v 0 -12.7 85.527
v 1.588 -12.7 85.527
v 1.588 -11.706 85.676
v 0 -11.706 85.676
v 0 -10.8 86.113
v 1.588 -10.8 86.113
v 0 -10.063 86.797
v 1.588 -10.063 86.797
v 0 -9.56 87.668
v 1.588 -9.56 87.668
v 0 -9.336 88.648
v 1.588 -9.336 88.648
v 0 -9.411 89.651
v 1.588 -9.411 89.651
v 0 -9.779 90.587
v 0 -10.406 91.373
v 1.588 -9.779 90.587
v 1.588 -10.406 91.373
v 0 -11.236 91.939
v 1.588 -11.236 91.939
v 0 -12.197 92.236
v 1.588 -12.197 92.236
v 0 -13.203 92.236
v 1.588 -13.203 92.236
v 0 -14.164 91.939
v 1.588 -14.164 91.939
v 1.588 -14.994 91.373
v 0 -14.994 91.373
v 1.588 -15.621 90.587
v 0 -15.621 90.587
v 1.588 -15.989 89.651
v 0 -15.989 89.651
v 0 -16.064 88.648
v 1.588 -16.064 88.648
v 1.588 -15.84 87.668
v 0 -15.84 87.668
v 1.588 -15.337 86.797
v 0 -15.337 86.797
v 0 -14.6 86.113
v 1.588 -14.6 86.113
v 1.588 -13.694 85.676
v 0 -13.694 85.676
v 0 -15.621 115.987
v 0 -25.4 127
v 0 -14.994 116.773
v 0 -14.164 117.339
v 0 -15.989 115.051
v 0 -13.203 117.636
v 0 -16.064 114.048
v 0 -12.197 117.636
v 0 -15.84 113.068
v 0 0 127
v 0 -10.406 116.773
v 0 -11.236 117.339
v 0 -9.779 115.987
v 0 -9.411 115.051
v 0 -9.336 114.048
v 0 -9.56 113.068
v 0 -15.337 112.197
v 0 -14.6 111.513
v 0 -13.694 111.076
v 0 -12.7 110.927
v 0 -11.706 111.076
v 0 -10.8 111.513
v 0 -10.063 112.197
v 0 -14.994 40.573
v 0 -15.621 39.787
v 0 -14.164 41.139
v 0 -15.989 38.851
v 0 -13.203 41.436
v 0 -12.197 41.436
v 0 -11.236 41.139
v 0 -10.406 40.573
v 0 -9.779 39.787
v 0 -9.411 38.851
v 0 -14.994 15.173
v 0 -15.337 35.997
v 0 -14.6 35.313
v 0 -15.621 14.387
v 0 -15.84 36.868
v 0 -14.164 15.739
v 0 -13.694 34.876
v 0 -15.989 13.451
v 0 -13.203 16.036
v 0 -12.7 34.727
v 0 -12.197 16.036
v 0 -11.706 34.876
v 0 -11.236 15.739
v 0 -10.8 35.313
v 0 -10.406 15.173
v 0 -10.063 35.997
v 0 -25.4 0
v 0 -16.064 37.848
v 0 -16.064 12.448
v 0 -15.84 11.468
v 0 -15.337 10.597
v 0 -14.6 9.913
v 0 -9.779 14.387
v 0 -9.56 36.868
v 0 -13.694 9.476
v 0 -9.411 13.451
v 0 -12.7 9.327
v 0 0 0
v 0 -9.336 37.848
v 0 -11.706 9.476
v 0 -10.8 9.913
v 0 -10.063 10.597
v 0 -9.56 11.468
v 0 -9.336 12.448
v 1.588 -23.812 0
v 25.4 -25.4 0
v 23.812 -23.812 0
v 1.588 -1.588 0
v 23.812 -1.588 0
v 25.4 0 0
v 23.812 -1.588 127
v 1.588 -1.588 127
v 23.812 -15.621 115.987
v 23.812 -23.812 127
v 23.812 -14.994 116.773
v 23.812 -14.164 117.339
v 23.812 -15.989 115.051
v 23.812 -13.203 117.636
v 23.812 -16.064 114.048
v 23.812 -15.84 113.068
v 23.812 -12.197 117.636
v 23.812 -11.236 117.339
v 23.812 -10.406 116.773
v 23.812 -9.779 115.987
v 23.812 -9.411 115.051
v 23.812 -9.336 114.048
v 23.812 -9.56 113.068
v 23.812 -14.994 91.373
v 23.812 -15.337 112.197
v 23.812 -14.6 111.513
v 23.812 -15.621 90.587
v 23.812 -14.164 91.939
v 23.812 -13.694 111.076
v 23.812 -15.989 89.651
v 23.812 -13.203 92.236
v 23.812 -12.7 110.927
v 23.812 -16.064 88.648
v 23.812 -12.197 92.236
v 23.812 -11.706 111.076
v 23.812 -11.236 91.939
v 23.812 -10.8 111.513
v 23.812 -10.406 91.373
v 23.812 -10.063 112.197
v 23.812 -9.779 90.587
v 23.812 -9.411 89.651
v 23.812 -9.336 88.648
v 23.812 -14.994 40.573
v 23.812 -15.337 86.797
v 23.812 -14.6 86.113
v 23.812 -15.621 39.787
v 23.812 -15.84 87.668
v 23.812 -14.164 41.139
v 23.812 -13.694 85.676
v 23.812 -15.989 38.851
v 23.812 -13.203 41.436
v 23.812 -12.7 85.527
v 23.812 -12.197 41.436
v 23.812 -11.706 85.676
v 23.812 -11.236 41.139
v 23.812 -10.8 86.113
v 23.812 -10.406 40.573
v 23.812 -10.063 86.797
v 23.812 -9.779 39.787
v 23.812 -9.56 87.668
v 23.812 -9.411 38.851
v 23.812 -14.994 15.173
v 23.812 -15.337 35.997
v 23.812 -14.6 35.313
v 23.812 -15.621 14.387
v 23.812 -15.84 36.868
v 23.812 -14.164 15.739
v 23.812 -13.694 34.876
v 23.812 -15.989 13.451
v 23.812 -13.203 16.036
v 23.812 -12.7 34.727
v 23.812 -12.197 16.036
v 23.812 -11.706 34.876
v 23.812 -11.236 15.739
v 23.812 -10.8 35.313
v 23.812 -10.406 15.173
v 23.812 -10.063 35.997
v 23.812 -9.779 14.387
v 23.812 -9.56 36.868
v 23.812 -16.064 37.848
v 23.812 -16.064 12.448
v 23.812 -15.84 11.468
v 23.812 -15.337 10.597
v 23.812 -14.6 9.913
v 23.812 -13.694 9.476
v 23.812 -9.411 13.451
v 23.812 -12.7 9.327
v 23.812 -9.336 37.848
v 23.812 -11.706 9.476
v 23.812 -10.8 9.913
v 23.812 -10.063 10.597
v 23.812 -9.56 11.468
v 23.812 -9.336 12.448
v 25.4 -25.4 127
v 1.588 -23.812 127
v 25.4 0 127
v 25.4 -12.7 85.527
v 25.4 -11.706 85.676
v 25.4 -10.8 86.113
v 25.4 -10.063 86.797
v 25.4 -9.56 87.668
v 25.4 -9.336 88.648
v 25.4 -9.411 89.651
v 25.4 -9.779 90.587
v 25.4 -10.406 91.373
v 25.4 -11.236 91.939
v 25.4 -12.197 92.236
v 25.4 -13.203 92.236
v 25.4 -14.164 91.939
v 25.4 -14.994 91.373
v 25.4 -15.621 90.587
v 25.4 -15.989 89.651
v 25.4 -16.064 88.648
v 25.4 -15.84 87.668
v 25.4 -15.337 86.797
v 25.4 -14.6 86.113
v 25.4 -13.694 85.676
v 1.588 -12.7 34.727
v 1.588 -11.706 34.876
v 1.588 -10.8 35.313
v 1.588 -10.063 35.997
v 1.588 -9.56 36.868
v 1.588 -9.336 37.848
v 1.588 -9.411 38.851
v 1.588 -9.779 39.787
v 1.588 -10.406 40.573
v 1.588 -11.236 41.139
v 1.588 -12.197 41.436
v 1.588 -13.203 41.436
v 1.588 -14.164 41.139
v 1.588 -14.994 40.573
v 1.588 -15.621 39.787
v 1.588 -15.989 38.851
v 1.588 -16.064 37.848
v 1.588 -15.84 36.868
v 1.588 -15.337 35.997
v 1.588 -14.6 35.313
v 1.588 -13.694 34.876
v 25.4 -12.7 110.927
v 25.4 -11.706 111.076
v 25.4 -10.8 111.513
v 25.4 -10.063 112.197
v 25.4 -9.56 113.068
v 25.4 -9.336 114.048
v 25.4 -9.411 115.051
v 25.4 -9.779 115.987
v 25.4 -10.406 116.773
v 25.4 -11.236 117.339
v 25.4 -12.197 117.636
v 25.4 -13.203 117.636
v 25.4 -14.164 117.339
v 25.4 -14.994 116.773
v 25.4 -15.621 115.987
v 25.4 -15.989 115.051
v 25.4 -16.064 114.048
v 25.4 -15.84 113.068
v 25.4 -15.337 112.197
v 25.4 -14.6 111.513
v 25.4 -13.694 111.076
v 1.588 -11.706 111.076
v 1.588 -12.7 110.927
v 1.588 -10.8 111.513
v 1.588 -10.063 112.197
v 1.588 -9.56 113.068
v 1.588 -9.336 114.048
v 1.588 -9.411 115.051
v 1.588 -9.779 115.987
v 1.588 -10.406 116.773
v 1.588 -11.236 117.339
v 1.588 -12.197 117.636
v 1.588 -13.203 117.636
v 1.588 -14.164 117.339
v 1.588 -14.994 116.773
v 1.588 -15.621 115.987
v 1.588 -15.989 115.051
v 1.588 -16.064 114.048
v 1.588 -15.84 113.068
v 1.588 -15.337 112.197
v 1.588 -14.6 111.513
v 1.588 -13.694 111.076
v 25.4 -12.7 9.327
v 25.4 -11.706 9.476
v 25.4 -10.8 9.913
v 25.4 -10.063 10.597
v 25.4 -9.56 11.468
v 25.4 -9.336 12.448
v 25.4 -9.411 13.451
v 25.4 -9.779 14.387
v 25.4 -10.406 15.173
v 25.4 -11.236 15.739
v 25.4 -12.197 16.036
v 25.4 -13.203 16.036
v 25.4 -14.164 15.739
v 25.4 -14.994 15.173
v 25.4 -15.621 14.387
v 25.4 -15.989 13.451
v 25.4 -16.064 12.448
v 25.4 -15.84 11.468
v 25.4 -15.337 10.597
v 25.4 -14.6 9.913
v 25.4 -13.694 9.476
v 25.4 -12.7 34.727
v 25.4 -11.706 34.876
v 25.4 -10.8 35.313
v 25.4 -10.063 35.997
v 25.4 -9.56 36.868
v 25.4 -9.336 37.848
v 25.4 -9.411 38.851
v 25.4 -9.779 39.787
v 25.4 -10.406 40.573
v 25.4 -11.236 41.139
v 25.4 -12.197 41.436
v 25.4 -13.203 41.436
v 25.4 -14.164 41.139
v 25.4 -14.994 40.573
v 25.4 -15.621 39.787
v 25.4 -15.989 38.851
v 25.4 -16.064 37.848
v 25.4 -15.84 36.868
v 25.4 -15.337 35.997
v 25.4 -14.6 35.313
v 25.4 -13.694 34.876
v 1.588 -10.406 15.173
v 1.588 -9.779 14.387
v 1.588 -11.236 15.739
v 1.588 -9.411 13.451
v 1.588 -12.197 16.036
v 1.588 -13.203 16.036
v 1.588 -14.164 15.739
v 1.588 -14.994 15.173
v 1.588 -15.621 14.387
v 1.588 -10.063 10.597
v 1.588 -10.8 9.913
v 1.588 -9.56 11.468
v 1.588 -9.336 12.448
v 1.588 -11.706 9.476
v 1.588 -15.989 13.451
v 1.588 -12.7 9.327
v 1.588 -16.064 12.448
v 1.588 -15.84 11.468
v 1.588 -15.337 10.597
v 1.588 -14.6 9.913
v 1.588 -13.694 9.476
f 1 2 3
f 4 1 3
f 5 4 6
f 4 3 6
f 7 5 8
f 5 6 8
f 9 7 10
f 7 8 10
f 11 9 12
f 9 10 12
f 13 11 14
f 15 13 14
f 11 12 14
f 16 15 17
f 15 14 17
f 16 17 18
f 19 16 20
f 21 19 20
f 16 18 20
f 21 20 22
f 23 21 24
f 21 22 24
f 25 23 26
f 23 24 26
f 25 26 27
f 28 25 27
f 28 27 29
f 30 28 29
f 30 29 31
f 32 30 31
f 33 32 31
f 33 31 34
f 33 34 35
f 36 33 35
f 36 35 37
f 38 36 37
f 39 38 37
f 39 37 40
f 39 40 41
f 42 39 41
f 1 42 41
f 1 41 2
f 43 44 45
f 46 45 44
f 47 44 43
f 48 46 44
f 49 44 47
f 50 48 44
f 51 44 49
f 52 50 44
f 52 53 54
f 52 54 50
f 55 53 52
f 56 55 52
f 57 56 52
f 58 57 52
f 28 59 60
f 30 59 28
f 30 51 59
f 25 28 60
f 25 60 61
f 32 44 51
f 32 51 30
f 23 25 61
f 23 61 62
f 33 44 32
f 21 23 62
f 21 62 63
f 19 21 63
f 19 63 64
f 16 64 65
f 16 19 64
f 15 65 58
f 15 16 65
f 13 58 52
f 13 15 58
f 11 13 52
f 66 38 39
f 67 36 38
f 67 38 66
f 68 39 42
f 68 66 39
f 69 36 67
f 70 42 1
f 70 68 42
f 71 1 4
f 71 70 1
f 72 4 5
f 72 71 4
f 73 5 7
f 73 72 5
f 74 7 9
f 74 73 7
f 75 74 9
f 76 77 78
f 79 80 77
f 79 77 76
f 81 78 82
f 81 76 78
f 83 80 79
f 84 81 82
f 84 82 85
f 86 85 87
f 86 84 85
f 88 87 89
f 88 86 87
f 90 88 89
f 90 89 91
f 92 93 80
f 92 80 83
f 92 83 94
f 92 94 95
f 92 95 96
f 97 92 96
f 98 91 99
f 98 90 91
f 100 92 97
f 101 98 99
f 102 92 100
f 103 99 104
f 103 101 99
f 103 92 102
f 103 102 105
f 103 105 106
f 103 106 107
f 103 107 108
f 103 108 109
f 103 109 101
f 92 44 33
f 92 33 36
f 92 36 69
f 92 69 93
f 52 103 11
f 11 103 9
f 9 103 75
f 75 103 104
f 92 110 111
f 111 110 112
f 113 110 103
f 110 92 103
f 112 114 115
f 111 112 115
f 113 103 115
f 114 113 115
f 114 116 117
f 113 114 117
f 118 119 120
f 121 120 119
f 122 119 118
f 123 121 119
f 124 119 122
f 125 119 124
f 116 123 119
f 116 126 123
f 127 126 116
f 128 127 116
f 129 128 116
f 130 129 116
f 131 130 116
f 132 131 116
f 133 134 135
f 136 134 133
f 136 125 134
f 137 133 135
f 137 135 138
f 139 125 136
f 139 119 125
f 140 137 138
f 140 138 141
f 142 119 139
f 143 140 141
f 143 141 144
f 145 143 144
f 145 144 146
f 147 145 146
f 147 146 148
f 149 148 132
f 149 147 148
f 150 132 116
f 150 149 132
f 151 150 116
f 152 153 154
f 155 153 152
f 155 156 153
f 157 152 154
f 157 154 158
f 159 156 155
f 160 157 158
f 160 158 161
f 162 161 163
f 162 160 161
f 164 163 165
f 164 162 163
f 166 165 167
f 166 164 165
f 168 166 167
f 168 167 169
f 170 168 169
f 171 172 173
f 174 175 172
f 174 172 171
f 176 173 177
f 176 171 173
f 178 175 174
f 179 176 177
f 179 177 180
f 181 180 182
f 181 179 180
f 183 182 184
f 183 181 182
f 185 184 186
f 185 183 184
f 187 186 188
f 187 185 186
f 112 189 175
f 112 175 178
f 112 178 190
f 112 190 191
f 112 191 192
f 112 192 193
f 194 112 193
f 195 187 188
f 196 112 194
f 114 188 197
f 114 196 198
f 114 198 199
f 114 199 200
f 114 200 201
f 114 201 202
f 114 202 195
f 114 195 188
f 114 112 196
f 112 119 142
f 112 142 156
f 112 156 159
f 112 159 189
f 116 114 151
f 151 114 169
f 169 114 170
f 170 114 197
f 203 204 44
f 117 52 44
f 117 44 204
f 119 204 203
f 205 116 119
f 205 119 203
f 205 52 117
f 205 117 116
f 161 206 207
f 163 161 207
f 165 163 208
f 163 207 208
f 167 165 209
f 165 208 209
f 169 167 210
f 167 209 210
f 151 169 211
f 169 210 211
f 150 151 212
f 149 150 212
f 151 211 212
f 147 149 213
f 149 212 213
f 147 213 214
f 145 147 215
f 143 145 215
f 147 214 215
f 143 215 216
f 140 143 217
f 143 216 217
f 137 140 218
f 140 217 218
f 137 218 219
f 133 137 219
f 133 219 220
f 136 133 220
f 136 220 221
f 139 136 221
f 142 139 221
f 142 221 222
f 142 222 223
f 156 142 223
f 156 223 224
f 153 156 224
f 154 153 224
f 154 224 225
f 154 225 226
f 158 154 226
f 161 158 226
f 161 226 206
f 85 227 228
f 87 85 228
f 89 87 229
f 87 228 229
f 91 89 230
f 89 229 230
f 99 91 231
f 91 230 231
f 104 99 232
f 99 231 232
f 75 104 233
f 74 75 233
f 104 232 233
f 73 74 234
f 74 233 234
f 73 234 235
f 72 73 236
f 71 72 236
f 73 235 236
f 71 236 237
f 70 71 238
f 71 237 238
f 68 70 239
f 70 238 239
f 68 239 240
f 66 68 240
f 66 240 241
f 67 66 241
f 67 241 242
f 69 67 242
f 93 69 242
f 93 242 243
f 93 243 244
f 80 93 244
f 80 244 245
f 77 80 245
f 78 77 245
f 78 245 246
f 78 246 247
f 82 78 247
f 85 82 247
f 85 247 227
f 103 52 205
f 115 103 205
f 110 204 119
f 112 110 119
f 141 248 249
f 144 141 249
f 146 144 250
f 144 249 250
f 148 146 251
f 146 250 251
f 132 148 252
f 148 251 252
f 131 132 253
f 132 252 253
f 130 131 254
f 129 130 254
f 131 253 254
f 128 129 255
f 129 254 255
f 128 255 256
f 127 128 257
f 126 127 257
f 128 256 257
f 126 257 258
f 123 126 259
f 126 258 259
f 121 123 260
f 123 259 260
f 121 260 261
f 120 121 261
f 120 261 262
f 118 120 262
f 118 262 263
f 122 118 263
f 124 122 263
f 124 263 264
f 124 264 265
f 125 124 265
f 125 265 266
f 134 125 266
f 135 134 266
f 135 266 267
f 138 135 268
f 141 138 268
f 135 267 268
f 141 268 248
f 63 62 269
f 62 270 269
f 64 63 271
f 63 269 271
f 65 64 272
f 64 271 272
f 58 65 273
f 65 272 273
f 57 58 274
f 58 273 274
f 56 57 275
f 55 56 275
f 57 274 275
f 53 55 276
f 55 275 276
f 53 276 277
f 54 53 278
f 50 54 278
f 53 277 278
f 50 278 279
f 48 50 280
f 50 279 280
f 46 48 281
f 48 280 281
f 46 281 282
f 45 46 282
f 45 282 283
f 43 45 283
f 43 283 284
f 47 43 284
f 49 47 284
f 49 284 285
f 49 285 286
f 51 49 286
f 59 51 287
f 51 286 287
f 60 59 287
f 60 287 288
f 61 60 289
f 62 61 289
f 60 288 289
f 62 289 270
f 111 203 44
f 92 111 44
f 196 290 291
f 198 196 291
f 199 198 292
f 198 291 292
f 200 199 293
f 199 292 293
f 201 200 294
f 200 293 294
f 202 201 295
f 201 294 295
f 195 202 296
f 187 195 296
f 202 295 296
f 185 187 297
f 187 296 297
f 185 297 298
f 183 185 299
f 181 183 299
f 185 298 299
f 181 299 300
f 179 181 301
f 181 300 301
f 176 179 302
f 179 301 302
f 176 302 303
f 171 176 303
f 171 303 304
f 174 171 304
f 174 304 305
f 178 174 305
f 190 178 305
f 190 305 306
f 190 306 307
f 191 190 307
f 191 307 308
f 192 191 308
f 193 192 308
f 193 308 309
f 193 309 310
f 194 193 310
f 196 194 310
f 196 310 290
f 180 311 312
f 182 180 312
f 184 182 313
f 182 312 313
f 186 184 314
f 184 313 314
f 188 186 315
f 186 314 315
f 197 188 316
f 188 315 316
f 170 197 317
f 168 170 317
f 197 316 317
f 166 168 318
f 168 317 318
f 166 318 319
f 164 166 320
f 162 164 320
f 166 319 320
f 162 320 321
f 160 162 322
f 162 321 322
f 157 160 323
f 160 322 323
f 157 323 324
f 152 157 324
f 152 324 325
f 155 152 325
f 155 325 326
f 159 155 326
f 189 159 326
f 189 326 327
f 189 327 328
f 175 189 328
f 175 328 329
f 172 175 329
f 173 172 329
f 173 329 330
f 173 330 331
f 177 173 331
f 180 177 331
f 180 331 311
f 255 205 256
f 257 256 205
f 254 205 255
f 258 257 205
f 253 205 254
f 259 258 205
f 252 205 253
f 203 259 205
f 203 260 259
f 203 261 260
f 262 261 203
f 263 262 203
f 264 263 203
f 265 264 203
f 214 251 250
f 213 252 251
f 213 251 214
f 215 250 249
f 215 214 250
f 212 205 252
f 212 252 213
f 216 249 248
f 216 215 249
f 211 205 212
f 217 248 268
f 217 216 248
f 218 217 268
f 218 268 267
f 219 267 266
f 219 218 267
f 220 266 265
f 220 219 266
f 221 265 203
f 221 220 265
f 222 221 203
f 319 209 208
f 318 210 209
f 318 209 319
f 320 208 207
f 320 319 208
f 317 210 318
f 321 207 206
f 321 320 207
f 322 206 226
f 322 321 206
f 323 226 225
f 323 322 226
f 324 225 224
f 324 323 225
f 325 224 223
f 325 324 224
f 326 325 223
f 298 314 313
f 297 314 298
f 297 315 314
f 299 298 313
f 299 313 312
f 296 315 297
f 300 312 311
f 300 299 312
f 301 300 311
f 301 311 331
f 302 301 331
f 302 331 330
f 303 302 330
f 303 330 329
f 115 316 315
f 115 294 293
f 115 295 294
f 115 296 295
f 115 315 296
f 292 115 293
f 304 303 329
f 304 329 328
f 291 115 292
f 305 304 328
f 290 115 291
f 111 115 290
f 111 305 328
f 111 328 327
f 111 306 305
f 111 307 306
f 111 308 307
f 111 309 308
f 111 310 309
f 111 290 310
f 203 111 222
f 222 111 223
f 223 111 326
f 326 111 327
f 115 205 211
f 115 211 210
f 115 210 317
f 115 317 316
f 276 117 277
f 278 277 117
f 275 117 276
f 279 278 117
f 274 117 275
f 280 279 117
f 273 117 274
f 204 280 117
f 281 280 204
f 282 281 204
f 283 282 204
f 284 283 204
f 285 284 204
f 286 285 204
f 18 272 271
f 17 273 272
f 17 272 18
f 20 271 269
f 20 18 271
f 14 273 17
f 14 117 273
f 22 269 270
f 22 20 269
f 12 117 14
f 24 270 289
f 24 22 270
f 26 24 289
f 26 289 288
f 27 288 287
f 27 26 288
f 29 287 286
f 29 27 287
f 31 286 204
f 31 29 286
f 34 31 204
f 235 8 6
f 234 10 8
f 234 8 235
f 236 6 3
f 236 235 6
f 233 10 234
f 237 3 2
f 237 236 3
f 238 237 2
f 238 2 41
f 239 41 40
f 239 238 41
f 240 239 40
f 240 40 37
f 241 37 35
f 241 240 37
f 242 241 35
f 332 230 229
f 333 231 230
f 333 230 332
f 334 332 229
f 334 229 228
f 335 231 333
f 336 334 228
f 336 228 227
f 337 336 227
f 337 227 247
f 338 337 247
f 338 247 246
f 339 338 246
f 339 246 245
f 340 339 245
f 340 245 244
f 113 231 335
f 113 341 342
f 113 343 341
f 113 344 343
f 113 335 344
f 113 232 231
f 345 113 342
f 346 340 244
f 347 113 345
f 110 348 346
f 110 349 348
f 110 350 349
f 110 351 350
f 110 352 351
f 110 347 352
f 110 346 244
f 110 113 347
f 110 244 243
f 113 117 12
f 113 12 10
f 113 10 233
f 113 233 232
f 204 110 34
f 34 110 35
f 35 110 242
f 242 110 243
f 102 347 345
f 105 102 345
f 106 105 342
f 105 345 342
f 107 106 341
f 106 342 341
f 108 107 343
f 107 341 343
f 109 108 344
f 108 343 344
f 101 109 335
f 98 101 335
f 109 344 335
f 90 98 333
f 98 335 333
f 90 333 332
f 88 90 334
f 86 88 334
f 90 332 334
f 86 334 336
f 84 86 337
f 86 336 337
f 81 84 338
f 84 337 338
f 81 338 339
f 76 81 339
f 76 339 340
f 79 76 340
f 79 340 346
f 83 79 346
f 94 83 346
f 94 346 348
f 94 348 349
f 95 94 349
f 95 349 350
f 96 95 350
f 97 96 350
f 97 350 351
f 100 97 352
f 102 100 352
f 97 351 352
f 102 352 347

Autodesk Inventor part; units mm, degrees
ref_plane "YZ Plane" through (0, 0, 0) normal (1, 0, 0) x (0, 1, 0)
ref_plane "XZ Plane" through (0, 0, 0) normal (0, 1, 0) x (-1, 0, 0)
ref_plane "XY Plane" through (0, 0, 0) normal (0, 0, 1) x (1, 0, 0)
sketch "Sketch1" plane through (0, 0, 0) normal (0, 0, 1) x (1, 0, 0)
  line L0 (0, 0) -> (25.4, 0)
  line L1 (25.4, 0) -> (25.4, -25.4)
  line L2 (25.4, -25.4) -> (0, -25.4)
  line L3 (0, -25.4) -> (0, 0)
  line L4 (1.5875, -23.8125) -> (23.8125, -23.8125)
  line L5 (23.8125, -23.8125) -> (23.8125, -1.5875)
  line L6 (23.8125, -1.5875) -> (1.5875, -1.5875)
  line L7 (1.5875, -1.5875) -> (1.5875, -23.8125)
  dimension "d0" = 25.4
  dimension "d1" = 25.4
  dimension "d2" = 1.5875
extrude "Extrusion1" add sketch "Sketch1" along normal blind 127
sketch "Sketch2" plane through (25.4, -25.4, 0) normal (1, 0, 0) x (0, 0, -1)
  circle A0 centre (-12.7, 12.7) radius 3.3734
  circle A1 centre (-38.1, 12.7) radius 3.3734
  circle A2 centre (-88.9, 12.7) radius 3.3734
  circle A3 centre (-114.3, 12.7) radius 3.3734
  line L0 (0, 25.4) -> (0, 0) projected
  line L1 (0, 25.4) -> (-127, 25.4) projected
  line L2 (0, 0) -> (-127, 0) projected
  line L3 (-127, 0) -> (-127, 25.4) projected
  dimension "d5" = 6.7469
  dimension "d7" = 12.7
  dimension "d8" = 12.7
  dimension "d9" = 12.7
  dimension "d10" = 38.1
  dimension "d11" = 12.7
  dimension "d12" = 38.1
  dimension "d13" = 12.7
  dimension "d14" = 12.7
extrude "Extrusion2" cut sketch "Sketch2" against normal blind 25.4 contours A0 | A1 | A2 | A3
properties part number "vertical support" material "Aluminum 6061"
